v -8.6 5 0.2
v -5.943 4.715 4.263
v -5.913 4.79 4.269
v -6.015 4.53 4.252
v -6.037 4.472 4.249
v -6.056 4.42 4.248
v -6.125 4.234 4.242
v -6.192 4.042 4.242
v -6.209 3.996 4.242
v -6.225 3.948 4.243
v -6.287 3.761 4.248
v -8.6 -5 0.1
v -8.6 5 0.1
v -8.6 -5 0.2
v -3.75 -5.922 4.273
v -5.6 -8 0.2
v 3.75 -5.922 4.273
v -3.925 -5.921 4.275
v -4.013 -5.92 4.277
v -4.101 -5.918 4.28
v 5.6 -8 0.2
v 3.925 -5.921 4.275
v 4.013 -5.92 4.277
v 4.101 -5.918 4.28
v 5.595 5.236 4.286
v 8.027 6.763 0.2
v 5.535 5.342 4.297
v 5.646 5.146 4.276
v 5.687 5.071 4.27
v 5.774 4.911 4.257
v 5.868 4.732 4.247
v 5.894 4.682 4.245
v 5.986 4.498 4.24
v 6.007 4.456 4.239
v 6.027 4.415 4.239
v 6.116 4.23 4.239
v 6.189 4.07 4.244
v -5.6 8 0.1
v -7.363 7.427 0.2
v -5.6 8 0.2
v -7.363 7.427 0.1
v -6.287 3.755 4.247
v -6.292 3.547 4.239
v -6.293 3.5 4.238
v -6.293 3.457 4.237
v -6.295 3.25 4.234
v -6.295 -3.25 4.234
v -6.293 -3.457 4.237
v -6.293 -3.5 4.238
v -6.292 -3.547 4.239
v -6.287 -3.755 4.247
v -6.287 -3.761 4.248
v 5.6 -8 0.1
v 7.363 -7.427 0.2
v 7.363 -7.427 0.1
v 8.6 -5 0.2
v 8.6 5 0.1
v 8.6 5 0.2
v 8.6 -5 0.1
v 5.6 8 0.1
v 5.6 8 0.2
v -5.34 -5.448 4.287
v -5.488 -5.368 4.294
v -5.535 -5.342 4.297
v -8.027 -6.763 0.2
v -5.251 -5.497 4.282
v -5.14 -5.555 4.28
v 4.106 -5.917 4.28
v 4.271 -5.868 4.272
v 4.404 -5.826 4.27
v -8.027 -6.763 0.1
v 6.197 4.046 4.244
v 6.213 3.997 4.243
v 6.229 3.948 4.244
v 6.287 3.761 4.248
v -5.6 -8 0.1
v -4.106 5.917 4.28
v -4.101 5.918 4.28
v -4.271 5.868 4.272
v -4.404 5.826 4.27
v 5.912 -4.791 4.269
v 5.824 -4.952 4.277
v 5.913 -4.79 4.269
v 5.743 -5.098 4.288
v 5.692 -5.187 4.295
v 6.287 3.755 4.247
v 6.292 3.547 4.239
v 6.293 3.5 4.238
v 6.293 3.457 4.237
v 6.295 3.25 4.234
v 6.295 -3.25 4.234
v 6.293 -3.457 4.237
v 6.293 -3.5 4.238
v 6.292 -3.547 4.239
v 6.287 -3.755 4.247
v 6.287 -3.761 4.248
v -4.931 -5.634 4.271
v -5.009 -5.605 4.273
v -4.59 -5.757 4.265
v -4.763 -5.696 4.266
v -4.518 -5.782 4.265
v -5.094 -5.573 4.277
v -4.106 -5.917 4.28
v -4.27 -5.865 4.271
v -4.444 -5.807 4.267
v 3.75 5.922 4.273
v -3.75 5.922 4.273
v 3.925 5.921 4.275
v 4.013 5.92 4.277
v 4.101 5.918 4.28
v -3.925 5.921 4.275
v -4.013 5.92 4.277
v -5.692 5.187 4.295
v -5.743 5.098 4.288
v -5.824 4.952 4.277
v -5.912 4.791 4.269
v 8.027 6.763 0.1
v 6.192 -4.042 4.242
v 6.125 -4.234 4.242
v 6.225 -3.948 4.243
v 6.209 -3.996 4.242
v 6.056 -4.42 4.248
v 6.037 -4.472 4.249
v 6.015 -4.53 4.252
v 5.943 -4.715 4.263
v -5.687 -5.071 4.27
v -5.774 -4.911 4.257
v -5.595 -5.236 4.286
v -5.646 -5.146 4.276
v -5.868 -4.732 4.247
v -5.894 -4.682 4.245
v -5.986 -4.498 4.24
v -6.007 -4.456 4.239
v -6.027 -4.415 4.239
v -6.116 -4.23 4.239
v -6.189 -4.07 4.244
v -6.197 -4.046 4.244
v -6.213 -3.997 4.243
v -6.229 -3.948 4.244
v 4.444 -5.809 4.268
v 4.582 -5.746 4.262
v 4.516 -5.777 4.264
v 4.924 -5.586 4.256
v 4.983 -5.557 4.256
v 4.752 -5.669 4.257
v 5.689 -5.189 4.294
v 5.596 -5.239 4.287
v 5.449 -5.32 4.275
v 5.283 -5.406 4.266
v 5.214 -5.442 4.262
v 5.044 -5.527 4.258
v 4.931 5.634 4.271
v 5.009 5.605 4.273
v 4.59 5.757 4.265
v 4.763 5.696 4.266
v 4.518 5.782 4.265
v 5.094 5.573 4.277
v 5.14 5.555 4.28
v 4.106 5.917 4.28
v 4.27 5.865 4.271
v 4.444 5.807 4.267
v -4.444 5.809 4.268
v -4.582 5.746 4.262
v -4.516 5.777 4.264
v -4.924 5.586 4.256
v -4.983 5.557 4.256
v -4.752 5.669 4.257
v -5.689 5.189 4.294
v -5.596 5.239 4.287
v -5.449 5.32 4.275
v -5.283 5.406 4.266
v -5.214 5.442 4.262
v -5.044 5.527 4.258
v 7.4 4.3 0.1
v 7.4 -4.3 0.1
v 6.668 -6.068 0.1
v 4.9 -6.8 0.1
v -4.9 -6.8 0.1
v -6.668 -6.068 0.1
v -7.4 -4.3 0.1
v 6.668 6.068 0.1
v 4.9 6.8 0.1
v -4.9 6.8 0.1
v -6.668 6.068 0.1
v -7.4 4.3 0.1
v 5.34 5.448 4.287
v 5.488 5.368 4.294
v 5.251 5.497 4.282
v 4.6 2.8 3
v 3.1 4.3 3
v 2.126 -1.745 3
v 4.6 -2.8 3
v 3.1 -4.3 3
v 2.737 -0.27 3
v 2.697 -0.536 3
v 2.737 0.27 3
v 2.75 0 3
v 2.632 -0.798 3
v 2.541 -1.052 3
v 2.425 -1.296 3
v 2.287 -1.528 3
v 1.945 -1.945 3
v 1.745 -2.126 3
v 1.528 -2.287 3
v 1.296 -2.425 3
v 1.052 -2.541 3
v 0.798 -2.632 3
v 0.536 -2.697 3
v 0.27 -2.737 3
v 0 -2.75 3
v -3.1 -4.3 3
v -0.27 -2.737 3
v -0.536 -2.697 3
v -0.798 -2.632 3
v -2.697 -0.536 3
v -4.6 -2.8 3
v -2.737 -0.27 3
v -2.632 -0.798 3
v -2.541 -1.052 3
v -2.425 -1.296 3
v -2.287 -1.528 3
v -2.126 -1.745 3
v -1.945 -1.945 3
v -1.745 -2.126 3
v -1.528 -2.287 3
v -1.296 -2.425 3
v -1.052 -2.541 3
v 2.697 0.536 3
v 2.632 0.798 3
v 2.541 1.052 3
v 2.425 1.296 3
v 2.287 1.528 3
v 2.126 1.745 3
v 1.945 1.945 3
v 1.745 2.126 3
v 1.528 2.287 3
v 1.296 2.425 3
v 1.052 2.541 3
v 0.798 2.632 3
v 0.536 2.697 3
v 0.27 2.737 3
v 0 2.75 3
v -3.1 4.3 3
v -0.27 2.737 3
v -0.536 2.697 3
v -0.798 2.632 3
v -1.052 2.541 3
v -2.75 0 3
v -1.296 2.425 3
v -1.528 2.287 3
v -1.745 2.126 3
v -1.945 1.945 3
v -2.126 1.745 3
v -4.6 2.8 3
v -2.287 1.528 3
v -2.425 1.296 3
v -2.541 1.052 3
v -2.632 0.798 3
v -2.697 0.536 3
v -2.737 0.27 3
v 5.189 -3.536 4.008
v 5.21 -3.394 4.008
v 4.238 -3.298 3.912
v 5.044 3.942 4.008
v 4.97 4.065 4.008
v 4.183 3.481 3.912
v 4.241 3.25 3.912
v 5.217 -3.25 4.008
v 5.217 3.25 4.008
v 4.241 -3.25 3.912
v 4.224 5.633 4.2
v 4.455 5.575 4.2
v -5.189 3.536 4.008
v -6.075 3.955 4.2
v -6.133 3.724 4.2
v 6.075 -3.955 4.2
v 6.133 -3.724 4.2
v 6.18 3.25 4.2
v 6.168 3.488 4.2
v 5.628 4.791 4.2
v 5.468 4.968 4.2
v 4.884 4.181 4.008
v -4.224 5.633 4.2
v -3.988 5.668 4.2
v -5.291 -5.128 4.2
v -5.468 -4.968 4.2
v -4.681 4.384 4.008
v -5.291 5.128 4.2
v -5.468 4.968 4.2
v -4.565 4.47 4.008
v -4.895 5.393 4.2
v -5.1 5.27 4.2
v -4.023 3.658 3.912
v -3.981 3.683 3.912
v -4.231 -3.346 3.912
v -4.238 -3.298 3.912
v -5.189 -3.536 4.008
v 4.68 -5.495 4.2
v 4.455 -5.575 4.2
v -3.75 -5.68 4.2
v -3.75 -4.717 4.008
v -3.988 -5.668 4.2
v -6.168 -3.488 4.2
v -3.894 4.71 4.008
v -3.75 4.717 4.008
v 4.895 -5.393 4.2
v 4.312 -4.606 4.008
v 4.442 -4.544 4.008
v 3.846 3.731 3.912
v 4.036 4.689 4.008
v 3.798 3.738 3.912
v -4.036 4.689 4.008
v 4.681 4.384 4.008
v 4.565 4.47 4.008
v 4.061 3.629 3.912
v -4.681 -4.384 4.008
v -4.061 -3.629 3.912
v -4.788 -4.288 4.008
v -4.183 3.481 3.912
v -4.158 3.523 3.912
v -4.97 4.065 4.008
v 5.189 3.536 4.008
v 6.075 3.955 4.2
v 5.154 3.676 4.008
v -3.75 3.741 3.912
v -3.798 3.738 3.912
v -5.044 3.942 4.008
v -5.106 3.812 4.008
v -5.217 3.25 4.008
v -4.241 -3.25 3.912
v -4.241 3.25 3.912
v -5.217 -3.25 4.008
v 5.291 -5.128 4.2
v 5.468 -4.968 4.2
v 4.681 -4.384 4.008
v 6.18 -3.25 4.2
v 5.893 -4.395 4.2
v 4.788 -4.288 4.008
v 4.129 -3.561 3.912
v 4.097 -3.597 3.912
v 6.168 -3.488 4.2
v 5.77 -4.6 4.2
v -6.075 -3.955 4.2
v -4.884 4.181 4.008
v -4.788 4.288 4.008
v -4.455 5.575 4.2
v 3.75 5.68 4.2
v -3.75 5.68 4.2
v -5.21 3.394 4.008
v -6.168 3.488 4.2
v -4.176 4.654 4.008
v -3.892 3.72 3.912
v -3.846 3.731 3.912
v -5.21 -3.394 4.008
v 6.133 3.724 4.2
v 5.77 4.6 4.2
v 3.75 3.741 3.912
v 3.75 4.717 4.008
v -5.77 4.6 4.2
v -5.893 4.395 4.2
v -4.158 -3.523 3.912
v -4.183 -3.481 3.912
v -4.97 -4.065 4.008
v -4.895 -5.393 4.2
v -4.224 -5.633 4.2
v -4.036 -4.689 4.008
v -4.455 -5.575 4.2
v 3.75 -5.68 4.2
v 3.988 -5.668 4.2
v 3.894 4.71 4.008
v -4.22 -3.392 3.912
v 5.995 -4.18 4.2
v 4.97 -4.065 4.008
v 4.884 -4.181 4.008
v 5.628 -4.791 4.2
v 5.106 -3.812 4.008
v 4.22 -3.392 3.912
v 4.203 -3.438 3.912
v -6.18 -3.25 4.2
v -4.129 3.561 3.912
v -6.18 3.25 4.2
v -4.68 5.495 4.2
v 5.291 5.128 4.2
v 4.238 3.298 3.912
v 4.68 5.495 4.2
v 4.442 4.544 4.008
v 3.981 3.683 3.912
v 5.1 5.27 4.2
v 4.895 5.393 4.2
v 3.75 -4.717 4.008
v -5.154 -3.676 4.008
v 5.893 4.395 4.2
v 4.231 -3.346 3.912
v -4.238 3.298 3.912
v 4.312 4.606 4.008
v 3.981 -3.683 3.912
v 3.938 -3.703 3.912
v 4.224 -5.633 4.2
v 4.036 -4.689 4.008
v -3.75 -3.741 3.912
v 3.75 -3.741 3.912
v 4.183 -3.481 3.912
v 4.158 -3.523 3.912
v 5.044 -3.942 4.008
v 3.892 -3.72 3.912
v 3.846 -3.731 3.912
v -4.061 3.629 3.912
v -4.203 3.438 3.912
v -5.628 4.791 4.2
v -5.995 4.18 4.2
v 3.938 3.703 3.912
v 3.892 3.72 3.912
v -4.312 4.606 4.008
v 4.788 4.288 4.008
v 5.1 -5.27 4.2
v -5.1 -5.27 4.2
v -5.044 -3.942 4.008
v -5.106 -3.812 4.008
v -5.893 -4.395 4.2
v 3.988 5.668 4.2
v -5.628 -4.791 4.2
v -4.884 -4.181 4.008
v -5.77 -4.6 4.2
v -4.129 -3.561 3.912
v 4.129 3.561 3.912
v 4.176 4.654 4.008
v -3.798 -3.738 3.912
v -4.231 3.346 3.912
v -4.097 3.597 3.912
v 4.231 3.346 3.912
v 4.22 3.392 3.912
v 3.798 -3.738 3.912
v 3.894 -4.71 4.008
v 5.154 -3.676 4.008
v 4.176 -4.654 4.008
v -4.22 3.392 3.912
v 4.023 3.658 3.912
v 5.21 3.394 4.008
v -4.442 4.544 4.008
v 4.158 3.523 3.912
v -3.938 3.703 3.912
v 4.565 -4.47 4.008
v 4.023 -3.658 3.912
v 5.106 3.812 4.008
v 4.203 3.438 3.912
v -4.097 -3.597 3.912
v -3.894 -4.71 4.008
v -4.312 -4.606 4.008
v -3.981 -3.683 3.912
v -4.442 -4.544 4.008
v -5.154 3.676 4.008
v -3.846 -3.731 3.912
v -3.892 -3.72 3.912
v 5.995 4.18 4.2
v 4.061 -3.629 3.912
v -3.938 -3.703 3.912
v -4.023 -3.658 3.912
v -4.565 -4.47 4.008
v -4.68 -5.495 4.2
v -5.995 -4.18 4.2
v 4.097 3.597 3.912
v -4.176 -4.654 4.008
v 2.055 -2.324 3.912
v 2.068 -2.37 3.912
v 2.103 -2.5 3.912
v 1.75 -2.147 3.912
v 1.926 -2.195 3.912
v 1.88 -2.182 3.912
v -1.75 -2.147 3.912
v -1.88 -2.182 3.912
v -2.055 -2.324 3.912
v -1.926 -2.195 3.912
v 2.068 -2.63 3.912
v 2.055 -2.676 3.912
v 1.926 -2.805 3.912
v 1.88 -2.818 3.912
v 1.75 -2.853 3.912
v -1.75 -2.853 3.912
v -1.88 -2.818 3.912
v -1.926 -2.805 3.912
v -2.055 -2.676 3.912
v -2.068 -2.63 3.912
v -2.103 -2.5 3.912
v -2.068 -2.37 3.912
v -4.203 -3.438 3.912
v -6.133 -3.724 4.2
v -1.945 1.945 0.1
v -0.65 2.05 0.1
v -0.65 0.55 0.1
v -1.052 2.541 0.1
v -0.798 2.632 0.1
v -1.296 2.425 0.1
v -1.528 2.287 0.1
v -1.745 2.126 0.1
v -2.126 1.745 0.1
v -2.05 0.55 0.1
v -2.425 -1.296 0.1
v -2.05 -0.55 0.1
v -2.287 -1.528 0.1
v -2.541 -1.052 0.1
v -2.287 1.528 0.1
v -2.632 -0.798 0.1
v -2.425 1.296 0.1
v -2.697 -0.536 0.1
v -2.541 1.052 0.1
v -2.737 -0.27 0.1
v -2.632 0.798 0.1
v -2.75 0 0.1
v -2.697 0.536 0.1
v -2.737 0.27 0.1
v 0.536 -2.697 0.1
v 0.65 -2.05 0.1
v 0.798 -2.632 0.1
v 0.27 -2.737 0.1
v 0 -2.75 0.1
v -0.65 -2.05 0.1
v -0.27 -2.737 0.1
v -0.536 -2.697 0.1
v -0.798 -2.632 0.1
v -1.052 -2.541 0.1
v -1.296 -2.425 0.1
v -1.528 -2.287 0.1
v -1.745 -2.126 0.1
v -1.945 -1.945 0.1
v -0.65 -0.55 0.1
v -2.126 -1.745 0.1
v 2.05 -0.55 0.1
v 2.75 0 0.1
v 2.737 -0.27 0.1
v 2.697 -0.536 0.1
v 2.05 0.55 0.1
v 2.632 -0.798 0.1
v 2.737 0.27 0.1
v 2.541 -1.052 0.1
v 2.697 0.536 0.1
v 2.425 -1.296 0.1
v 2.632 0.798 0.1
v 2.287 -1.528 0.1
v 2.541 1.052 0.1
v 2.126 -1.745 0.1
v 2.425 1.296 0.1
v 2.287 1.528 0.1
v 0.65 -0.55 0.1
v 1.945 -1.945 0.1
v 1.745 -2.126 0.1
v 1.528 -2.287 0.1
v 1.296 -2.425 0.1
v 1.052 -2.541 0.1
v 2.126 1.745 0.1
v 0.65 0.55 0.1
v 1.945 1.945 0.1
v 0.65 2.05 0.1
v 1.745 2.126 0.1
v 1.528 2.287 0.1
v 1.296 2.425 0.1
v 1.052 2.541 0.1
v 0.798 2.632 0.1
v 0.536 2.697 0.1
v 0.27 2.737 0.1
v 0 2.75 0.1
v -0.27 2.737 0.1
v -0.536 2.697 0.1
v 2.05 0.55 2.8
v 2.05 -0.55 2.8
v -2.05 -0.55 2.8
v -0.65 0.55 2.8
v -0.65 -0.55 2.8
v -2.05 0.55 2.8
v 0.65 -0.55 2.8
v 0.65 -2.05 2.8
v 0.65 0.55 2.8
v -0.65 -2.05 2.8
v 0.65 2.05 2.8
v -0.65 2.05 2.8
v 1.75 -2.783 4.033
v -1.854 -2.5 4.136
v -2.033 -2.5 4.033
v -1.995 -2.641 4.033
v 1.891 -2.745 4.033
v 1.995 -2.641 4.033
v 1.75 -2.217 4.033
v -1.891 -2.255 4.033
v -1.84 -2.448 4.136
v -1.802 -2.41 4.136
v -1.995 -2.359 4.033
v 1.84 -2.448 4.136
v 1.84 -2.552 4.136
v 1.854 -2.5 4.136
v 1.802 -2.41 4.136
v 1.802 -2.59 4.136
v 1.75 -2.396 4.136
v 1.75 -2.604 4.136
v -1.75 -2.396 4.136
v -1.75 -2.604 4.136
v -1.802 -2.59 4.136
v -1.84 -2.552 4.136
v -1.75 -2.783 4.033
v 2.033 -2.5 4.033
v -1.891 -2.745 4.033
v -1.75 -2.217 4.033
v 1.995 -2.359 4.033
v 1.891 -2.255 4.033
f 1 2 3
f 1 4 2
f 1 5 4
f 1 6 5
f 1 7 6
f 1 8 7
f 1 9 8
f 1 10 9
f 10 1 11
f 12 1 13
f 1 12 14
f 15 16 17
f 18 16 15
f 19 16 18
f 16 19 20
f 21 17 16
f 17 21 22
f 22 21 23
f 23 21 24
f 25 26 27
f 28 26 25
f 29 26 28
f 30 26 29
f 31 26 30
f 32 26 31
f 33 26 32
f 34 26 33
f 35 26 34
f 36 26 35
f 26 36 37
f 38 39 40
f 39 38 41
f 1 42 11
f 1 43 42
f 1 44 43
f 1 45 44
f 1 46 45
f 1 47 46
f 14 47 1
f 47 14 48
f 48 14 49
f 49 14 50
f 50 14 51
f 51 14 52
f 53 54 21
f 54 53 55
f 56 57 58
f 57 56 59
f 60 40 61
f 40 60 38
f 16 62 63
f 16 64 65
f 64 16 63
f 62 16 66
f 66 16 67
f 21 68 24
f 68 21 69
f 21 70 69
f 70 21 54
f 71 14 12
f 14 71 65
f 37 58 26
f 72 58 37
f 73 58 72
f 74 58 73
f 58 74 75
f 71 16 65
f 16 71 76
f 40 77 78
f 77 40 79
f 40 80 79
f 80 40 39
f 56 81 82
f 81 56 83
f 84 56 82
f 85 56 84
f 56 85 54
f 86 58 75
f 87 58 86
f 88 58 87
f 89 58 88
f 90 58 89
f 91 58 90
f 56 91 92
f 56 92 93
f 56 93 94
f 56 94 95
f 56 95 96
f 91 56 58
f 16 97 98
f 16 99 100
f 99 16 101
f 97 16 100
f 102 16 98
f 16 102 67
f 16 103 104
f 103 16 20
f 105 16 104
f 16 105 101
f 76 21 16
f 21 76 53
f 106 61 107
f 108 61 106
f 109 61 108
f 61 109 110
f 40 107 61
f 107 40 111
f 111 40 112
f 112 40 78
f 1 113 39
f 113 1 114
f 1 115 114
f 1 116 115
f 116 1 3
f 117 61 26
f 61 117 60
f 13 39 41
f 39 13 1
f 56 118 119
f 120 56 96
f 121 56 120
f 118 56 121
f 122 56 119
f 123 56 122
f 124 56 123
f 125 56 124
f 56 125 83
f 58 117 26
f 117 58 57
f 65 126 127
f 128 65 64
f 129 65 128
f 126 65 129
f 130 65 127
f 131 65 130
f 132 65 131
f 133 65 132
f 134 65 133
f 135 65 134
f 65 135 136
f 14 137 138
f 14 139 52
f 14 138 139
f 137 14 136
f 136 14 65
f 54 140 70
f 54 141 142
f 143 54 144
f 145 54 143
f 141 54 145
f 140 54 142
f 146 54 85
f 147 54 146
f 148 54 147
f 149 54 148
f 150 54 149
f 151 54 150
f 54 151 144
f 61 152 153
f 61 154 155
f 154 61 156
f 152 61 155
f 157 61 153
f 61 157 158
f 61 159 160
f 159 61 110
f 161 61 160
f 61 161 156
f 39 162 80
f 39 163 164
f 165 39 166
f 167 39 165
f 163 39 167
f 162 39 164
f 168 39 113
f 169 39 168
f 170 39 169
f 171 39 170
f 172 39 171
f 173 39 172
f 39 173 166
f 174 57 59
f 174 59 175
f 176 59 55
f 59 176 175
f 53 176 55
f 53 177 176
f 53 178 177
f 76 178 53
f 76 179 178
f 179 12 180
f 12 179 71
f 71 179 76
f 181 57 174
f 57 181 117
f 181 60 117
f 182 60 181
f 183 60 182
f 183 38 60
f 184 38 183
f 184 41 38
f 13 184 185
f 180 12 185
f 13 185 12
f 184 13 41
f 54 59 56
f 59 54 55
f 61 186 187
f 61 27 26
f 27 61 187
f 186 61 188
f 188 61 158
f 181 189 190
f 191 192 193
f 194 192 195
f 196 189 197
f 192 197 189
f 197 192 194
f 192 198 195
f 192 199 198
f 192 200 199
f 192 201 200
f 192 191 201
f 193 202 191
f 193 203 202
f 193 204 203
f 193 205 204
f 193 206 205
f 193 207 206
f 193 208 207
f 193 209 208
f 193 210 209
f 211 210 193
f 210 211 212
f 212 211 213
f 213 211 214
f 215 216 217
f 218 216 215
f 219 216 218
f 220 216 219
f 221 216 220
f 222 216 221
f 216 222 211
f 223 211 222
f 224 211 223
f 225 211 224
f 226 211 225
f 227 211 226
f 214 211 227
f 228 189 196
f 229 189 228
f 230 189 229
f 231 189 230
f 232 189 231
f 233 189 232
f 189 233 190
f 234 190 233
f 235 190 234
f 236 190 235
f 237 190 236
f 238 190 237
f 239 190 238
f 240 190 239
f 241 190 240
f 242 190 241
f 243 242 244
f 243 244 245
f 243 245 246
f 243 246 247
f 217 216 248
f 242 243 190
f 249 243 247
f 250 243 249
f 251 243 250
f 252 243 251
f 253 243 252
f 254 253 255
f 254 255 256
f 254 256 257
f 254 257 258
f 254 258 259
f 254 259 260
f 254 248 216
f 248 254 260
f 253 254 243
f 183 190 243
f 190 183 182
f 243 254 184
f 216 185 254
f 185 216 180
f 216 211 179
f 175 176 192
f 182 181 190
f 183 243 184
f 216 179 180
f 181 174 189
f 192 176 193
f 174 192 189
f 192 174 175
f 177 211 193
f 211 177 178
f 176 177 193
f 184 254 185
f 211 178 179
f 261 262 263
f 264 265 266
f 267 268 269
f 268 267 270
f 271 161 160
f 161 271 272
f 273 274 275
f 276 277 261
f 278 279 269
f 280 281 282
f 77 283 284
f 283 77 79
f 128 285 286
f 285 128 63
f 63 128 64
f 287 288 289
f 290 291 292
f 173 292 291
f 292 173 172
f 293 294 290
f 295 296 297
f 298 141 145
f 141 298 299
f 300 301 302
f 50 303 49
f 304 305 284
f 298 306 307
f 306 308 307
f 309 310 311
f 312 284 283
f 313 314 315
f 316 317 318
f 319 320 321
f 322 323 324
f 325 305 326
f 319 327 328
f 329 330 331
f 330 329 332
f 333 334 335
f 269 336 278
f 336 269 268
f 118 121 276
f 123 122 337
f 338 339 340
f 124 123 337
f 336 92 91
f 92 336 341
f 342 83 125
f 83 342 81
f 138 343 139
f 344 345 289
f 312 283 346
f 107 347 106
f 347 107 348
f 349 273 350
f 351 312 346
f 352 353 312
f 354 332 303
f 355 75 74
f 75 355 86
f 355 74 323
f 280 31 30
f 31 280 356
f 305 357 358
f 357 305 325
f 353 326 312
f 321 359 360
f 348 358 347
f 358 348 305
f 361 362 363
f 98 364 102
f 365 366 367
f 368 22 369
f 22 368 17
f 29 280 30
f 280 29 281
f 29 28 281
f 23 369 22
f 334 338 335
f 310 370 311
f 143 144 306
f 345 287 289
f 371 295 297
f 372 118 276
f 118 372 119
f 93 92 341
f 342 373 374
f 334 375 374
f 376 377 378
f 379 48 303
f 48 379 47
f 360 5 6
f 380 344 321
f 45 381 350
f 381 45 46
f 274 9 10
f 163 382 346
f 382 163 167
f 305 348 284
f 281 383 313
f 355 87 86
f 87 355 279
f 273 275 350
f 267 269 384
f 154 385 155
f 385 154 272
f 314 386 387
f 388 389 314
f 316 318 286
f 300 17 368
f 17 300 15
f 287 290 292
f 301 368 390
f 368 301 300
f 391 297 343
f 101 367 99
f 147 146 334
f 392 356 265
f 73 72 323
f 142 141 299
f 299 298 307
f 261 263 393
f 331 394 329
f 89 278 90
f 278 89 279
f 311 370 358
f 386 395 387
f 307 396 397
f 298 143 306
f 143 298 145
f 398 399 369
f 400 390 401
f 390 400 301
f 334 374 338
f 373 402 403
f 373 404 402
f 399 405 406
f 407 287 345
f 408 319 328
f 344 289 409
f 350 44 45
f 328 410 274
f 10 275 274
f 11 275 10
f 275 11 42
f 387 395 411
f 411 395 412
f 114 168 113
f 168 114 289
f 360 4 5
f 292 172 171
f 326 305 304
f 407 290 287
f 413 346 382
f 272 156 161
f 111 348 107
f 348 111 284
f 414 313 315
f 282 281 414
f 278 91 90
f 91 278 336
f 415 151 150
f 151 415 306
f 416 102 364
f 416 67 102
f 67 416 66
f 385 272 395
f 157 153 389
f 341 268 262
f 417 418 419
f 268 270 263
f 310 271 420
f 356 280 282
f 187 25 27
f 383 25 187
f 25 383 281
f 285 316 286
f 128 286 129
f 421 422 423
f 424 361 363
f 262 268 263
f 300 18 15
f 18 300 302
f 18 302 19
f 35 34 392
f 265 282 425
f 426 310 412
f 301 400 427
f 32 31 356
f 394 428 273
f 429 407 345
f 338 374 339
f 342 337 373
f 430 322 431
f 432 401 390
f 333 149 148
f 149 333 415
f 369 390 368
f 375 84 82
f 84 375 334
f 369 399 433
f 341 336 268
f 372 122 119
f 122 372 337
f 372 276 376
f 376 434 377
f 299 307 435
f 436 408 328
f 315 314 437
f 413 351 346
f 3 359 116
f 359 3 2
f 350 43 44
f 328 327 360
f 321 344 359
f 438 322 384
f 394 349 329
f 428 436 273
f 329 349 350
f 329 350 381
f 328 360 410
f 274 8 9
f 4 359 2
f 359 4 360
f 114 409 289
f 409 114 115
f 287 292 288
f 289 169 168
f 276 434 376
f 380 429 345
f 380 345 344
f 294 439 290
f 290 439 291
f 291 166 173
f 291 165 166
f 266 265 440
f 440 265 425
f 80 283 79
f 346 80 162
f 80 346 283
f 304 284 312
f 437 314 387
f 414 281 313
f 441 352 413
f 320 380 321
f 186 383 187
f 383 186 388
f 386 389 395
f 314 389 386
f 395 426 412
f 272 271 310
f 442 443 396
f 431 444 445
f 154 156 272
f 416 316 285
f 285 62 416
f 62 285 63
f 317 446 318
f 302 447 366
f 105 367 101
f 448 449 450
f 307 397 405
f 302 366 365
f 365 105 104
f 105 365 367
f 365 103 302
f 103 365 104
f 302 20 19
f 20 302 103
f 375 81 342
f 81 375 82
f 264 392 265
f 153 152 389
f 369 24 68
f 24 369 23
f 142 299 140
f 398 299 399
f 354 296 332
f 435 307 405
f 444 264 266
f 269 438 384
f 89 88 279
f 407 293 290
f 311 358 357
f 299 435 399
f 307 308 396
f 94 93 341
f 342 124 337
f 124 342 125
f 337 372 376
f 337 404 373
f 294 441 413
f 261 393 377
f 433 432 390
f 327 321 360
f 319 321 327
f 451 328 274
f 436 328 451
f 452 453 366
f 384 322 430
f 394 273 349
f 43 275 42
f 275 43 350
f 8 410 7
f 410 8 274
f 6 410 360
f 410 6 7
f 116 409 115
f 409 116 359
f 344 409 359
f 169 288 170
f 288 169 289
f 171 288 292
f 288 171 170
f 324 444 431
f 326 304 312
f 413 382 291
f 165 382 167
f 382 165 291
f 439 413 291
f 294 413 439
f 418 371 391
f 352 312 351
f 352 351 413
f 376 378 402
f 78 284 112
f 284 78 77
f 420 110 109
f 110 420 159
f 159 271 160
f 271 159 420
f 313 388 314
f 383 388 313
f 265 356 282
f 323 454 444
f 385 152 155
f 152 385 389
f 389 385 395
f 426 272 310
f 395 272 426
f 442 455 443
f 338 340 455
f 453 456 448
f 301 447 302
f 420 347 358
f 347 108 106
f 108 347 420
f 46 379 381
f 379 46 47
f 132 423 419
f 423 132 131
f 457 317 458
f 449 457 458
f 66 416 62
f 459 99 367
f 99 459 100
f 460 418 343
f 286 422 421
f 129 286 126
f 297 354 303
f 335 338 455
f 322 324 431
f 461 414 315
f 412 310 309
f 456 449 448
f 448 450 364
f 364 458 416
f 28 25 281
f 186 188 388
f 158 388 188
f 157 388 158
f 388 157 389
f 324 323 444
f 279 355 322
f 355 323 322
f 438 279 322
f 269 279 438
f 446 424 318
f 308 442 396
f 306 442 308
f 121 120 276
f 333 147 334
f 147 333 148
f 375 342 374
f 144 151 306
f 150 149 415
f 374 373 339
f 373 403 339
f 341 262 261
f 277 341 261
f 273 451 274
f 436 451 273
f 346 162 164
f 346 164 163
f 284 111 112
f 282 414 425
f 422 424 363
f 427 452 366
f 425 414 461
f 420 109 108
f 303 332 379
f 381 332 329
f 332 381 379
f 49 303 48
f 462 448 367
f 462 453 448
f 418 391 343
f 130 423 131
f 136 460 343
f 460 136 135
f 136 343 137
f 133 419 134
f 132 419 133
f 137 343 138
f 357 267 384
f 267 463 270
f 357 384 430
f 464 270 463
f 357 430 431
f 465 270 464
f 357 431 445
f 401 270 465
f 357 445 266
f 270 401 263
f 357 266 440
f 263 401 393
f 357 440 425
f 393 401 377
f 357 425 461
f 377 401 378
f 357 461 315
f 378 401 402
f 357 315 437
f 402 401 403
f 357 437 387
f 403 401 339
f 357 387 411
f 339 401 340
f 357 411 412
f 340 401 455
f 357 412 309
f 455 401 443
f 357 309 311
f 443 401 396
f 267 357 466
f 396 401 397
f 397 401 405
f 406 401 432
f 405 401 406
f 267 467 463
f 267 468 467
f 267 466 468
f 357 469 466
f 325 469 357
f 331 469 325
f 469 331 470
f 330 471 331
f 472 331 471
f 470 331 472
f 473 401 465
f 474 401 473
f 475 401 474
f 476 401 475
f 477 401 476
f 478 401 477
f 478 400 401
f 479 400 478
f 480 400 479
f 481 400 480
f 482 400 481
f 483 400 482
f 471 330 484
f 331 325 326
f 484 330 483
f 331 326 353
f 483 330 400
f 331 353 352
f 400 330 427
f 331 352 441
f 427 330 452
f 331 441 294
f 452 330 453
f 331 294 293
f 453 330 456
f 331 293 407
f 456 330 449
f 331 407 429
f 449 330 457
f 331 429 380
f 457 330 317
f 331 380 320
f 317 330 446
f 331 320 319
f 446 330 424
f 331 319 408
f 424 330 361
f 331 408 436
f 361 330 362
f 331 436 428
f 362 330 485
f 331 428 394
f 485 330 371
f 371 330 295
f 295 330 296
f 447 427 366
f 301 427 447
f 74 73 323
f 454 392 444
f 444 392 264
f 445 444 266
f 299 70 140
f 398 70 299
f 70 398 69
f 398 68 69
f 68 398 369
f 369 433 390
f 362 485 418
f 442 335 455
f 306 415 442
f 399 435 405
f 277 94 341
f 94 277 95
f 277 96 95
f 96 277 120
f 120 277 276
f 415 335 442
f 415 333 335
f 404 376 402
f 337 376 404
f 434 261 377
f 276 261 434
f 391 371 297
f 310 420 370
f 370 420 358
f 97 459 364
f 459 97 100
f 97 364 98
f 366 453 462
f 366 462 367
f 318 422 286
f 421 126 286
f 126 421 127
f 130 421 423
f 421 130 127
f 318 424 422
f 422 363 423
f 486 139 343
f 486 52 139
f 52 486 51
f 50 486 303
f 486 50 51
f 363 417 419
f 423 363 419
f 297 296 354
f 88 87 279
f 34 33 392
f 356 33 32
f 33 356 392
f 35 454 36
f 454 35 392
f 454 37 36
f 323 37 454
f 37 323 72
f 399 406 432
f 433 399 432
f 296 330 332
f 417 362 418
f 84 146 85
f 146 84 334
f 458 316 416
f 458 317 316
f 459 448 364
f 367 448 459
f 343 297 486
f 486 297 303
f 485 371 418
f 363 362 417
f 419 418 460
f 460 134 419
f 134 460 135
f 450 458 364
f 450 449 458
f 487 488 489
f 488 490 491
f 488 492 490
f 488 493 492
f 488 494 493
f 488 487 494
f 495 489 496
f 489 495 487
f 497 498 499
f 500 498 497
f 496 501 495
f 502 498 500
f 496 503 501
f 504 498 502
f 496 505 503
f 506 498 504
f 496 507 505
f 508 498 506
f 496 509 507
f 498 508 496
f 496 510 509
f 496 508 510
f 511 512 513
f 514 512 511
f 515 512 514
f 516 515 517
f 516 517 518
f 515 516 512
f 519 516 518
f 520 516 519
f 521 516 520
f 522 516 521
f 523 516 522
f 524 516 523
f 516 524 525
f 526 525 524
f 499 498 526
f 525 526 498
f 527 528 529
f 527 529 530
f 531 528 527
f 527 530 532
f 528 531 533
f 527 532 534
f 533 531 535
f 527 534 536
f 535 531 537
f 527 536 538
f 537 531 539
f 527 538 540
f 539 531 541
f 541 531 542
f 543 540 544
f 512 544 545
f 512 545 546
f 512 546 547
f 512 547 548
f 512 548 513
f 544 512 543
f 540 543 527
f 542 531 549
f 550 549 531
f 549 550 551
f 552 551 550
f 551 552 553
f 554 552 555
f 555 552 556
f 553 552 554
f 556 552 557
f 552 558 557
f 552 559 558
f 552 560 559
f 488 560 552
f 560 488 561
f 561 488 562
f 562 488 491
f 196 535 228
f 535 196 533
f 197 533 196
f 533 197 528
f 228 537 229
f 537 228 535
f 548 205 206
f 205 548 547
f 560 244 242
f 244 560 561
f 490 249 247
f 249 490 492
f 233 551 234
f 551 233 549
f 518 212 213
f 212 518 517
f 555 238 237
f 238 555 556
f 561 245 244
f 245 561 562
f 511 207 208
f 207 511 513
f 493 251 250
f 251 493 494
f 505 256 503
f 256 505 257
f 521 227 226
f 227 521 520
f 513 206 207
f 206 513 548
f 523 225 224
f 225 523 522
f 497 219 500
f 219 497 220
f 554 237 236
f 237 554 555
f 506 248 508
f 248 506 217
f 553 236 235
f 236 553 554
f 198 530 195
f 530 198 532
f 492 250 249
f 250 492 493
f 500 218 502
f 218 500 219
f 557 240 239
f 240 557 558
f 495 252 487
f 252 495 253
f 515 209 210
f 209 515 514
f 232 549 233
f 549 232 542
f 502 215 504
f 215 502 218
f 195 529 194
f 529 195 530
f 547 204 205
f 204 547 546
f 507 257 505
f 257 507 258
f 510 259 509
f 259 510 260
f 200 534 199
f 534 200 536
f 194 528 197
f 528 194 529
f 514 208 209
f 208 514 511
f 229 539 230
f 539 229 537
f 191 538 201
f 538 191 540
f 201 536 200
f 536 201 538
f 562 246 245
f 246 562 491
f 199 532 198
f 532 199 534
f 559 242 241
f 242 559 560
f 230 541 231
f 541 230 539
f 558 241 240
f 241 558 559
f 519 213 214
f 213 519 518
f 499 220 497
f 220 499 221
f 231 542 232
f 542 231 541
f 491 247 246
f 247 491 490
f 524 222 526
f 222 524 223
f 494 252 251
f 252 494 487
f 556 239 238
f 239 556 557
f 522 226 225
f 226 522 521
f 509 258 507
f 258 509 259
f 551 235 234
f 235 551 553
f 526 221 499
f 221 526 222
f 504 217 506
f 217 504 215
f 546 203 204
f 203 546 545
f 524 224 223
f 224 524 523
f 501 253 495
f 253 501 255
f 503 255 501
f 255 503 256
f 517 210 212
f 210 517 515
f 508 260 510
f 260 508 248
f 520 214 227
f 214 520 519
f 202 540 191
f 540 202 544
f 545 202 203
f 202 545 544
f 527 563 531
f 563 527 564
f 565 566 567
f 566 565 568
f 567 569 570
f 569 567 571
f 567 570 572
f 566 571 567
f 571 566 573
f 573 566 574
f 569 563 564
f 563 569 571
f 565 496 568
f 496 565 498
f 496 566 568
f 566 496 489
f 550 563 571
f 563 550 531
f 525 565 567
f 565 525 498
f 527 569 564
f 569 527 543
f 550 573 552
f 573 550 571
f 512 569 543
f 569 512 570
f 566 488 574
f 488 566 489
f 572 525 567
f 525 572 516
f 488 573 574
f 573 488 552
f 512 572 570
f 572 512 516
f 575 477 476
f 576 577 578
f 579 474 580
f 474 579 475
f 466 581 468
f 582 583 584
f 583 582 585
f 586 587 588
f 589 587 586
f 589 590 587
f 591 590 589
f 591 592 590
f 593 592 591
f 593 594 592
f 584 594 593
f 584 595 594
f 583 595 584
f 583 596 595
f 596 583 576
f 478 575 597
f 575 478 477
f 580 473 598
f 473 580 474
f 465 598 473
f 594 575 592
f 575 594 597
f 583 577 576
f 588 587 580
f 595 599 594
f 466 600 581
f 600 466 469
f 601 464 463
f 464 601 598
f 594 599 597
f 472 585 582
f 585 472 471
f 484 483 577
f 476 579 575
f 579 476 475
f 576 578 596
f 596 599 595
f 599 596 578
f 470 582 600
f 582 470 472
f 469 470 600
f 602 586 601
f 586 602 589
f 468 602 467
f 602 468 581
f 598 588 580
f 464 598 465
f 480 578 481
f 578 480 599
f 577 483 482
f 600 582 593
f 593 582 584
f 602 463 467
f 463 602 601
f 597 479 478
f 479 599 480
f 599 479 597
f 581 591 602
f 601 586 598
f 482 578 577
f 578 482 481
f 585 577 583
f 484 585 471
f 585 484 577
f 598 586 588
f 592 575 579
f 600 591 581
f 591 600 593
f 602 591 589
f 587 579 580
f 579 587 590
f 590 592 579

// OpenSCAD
// --- Chicago Steno Keycap: Library-Free Rebuild with MX Stem ---
// Rebuilt for stability, correct geometric orientation, and home-row indicators.
// Optimized with original Chicago Steno "heritage" dimensions.

// --- Global Settings ---
fn = 64; // Smoothness of curves
keyID = 1;

// HOMING INDICATOR TOGGLE:
has_homing_line = true;

// --- Row Profile Selection ---
// R1: Top | R2: Num | R3: Home | R4: Bottom | R5: Thumb
profile_row = 3;

// ADJUSTED HEIGHTS BASED ON REPOSITORY DNA:
function get_row_height(row) =
  row == 1 ? 9.0
  : row == 2 ? 7.5
  : row == 3 ? 5.0
  : // Balanced for 3mm stem + 2mm roof
  row == 4 ? 4.5
  : 4.5;

function get_row_skew(row) =
  row == 1 ? -10
  : row == 2 ? -5
  : row == 3 ? 0
  : row == 4 ? 5
  : 10;

// --- Profile Dimensions (Chicago Steno Standards) ---
bottom_w = 17.20;
bottom_l = 16.00;
top_w_diff = 5.6; // Original steeper taper
top_l_diff = 5.0; // Original steeper taper
key_h = get_row_height(profile_row);

wall_thickness = 1.2;
top_thickness = 2.0; // Increased for original "thick roof" feel

// --- Interaction Parameters ---
x_skew = get_row_skew(profile_row);
y_skew = 0;

// --- Dish (Scoop) Parameters ---
// Focused dimensions to match original finger-well feel
dish_depth = 1.1;
dish_width = 11.5;
dish_length = 10.5;

// --- Homing Indicator Parameters ---
homing_line_w = 3.5;
homing_line_h = 0.4;
homing_line_l = 0.8;

// --- MX Stem Dimensions (Choc V2 Compatible) ---
stem_h = 3.0; // FIXED at 3.0mm
cross_depth = 2.8;
v_bar_w = 1.1;
h_bar_w = 1.3;
cross_l = 4.0;

// --- Helper Modules ---
module rounded_rect(w, l, r) {
  offset(r=r) square([w - 2 * r, l - 2 * r], center=true);
}

module mx_stem_cutout() {
  union() {
    translate([0, 0, cross_depth / 2 - 0.1])
      cube([cross_l + 0.1, v_bar_w, cross_depth + 0.2], center=true);
    translate([0, 0, cross_depth / 2 - 0.1])
      cube([h_bar_w, cross_l + 0.1, cross_depth + 0.2], center=true);
  }
}

module homing_line() {
  translate([0, -2.5, -0.15])
    hull() {
      translate([-homing_line_w / 2, 0, 0]) sphere(d=homing_line_l, $fn=12);
      translate([homing_line_w / 2, 0, 0]) sphere(d=homing_line_l, $fn=12);
    }
}

module dish_cutter() {
  hull() {
    translate([-dish_width / 2 + 2, -dish_length / 2 + 2, 0]) sphere(r=10, $fn=fn);
    translate([dish_width / 2 - 2, -dish_length / 2 + 2, 0]) sphere(r=10, $fn=fn);
    translate([-dish_width / 2 + 2, dish_length / 2 - 2, 0]) sphere(r=10, $fn=fn);
    translate([dish_width / 2 - 2, dish_length / 2 - 2, 0]) sphere(r=10, $fn=fn);
  }
}

// --- Main Build ---
difference() {
  union() {
    // 1. THE KEYCAP BODY
    color("Gold")
      difference() {
        hull() {
          translate([0, 0, 0.1]) linear_extrude(height=0.1) rounded_rect(bottom_w, bottom_l, 3);
          translate([0, 0, key_h]) rotate([x_skew, y_skew, 0]) linear_extrude(height=0.1) rounded_rect(bottom_w - top_w_diff, bottom_l - top_l_diff, 2);
        }

        translate([0, 0, -0.1])
          hull() {
            translate([0, 0, 0.1]) linear_extrude(height=0.1) rounded_rect(bottom_w - wall_thickness * 2, bottom_l - wall_thickness * 2, 2.5);
            translate([0, 0, stem_h]) rotate([x_skew, y_skew, 0]) linear_extrude(height=0.1) rounded_rect(bottom_w - top_w_diff - wall_thickness * 2, bottom_l - top_l_diff - wall_thickness * 2, 1.5);
          }

        translate([0, 0, key_h + 10 - dish_depth])
          rotate([x_skew, y_skew, 0])
            dish_cutter();
      }

    if (has_homing_line) {
      color("Red")
        translate([0, 0, key_h - dish_depth])
          rotate([x_skew, y_skew, 0])
            homing_line();
    }

    color("Silver")
      difference() {
        intersection() {
          hull() {
            translate([0, 0, 0.1]) linear_extrude(height=0.1) rounded_rect(bottom_w, bottom_l, 3);
            translate([0, 0, stem_h]) rotate([x_skew, y_skew, 0]) linear_extrude(height=0.1) rounded_rect(bottom_w - top_w_diff, bottom_l - top_l_diff, 2);
          }
          cylinder(d=5.5, h=stem_h + 0.1, center=false, $fn=fn);
        }
        mx_stem_cutout();
      }
  }

  // --- DEBUG: HAFT CUT ---
  // translate([0, -25, -1]) cube([20, 50, 20]);
}
